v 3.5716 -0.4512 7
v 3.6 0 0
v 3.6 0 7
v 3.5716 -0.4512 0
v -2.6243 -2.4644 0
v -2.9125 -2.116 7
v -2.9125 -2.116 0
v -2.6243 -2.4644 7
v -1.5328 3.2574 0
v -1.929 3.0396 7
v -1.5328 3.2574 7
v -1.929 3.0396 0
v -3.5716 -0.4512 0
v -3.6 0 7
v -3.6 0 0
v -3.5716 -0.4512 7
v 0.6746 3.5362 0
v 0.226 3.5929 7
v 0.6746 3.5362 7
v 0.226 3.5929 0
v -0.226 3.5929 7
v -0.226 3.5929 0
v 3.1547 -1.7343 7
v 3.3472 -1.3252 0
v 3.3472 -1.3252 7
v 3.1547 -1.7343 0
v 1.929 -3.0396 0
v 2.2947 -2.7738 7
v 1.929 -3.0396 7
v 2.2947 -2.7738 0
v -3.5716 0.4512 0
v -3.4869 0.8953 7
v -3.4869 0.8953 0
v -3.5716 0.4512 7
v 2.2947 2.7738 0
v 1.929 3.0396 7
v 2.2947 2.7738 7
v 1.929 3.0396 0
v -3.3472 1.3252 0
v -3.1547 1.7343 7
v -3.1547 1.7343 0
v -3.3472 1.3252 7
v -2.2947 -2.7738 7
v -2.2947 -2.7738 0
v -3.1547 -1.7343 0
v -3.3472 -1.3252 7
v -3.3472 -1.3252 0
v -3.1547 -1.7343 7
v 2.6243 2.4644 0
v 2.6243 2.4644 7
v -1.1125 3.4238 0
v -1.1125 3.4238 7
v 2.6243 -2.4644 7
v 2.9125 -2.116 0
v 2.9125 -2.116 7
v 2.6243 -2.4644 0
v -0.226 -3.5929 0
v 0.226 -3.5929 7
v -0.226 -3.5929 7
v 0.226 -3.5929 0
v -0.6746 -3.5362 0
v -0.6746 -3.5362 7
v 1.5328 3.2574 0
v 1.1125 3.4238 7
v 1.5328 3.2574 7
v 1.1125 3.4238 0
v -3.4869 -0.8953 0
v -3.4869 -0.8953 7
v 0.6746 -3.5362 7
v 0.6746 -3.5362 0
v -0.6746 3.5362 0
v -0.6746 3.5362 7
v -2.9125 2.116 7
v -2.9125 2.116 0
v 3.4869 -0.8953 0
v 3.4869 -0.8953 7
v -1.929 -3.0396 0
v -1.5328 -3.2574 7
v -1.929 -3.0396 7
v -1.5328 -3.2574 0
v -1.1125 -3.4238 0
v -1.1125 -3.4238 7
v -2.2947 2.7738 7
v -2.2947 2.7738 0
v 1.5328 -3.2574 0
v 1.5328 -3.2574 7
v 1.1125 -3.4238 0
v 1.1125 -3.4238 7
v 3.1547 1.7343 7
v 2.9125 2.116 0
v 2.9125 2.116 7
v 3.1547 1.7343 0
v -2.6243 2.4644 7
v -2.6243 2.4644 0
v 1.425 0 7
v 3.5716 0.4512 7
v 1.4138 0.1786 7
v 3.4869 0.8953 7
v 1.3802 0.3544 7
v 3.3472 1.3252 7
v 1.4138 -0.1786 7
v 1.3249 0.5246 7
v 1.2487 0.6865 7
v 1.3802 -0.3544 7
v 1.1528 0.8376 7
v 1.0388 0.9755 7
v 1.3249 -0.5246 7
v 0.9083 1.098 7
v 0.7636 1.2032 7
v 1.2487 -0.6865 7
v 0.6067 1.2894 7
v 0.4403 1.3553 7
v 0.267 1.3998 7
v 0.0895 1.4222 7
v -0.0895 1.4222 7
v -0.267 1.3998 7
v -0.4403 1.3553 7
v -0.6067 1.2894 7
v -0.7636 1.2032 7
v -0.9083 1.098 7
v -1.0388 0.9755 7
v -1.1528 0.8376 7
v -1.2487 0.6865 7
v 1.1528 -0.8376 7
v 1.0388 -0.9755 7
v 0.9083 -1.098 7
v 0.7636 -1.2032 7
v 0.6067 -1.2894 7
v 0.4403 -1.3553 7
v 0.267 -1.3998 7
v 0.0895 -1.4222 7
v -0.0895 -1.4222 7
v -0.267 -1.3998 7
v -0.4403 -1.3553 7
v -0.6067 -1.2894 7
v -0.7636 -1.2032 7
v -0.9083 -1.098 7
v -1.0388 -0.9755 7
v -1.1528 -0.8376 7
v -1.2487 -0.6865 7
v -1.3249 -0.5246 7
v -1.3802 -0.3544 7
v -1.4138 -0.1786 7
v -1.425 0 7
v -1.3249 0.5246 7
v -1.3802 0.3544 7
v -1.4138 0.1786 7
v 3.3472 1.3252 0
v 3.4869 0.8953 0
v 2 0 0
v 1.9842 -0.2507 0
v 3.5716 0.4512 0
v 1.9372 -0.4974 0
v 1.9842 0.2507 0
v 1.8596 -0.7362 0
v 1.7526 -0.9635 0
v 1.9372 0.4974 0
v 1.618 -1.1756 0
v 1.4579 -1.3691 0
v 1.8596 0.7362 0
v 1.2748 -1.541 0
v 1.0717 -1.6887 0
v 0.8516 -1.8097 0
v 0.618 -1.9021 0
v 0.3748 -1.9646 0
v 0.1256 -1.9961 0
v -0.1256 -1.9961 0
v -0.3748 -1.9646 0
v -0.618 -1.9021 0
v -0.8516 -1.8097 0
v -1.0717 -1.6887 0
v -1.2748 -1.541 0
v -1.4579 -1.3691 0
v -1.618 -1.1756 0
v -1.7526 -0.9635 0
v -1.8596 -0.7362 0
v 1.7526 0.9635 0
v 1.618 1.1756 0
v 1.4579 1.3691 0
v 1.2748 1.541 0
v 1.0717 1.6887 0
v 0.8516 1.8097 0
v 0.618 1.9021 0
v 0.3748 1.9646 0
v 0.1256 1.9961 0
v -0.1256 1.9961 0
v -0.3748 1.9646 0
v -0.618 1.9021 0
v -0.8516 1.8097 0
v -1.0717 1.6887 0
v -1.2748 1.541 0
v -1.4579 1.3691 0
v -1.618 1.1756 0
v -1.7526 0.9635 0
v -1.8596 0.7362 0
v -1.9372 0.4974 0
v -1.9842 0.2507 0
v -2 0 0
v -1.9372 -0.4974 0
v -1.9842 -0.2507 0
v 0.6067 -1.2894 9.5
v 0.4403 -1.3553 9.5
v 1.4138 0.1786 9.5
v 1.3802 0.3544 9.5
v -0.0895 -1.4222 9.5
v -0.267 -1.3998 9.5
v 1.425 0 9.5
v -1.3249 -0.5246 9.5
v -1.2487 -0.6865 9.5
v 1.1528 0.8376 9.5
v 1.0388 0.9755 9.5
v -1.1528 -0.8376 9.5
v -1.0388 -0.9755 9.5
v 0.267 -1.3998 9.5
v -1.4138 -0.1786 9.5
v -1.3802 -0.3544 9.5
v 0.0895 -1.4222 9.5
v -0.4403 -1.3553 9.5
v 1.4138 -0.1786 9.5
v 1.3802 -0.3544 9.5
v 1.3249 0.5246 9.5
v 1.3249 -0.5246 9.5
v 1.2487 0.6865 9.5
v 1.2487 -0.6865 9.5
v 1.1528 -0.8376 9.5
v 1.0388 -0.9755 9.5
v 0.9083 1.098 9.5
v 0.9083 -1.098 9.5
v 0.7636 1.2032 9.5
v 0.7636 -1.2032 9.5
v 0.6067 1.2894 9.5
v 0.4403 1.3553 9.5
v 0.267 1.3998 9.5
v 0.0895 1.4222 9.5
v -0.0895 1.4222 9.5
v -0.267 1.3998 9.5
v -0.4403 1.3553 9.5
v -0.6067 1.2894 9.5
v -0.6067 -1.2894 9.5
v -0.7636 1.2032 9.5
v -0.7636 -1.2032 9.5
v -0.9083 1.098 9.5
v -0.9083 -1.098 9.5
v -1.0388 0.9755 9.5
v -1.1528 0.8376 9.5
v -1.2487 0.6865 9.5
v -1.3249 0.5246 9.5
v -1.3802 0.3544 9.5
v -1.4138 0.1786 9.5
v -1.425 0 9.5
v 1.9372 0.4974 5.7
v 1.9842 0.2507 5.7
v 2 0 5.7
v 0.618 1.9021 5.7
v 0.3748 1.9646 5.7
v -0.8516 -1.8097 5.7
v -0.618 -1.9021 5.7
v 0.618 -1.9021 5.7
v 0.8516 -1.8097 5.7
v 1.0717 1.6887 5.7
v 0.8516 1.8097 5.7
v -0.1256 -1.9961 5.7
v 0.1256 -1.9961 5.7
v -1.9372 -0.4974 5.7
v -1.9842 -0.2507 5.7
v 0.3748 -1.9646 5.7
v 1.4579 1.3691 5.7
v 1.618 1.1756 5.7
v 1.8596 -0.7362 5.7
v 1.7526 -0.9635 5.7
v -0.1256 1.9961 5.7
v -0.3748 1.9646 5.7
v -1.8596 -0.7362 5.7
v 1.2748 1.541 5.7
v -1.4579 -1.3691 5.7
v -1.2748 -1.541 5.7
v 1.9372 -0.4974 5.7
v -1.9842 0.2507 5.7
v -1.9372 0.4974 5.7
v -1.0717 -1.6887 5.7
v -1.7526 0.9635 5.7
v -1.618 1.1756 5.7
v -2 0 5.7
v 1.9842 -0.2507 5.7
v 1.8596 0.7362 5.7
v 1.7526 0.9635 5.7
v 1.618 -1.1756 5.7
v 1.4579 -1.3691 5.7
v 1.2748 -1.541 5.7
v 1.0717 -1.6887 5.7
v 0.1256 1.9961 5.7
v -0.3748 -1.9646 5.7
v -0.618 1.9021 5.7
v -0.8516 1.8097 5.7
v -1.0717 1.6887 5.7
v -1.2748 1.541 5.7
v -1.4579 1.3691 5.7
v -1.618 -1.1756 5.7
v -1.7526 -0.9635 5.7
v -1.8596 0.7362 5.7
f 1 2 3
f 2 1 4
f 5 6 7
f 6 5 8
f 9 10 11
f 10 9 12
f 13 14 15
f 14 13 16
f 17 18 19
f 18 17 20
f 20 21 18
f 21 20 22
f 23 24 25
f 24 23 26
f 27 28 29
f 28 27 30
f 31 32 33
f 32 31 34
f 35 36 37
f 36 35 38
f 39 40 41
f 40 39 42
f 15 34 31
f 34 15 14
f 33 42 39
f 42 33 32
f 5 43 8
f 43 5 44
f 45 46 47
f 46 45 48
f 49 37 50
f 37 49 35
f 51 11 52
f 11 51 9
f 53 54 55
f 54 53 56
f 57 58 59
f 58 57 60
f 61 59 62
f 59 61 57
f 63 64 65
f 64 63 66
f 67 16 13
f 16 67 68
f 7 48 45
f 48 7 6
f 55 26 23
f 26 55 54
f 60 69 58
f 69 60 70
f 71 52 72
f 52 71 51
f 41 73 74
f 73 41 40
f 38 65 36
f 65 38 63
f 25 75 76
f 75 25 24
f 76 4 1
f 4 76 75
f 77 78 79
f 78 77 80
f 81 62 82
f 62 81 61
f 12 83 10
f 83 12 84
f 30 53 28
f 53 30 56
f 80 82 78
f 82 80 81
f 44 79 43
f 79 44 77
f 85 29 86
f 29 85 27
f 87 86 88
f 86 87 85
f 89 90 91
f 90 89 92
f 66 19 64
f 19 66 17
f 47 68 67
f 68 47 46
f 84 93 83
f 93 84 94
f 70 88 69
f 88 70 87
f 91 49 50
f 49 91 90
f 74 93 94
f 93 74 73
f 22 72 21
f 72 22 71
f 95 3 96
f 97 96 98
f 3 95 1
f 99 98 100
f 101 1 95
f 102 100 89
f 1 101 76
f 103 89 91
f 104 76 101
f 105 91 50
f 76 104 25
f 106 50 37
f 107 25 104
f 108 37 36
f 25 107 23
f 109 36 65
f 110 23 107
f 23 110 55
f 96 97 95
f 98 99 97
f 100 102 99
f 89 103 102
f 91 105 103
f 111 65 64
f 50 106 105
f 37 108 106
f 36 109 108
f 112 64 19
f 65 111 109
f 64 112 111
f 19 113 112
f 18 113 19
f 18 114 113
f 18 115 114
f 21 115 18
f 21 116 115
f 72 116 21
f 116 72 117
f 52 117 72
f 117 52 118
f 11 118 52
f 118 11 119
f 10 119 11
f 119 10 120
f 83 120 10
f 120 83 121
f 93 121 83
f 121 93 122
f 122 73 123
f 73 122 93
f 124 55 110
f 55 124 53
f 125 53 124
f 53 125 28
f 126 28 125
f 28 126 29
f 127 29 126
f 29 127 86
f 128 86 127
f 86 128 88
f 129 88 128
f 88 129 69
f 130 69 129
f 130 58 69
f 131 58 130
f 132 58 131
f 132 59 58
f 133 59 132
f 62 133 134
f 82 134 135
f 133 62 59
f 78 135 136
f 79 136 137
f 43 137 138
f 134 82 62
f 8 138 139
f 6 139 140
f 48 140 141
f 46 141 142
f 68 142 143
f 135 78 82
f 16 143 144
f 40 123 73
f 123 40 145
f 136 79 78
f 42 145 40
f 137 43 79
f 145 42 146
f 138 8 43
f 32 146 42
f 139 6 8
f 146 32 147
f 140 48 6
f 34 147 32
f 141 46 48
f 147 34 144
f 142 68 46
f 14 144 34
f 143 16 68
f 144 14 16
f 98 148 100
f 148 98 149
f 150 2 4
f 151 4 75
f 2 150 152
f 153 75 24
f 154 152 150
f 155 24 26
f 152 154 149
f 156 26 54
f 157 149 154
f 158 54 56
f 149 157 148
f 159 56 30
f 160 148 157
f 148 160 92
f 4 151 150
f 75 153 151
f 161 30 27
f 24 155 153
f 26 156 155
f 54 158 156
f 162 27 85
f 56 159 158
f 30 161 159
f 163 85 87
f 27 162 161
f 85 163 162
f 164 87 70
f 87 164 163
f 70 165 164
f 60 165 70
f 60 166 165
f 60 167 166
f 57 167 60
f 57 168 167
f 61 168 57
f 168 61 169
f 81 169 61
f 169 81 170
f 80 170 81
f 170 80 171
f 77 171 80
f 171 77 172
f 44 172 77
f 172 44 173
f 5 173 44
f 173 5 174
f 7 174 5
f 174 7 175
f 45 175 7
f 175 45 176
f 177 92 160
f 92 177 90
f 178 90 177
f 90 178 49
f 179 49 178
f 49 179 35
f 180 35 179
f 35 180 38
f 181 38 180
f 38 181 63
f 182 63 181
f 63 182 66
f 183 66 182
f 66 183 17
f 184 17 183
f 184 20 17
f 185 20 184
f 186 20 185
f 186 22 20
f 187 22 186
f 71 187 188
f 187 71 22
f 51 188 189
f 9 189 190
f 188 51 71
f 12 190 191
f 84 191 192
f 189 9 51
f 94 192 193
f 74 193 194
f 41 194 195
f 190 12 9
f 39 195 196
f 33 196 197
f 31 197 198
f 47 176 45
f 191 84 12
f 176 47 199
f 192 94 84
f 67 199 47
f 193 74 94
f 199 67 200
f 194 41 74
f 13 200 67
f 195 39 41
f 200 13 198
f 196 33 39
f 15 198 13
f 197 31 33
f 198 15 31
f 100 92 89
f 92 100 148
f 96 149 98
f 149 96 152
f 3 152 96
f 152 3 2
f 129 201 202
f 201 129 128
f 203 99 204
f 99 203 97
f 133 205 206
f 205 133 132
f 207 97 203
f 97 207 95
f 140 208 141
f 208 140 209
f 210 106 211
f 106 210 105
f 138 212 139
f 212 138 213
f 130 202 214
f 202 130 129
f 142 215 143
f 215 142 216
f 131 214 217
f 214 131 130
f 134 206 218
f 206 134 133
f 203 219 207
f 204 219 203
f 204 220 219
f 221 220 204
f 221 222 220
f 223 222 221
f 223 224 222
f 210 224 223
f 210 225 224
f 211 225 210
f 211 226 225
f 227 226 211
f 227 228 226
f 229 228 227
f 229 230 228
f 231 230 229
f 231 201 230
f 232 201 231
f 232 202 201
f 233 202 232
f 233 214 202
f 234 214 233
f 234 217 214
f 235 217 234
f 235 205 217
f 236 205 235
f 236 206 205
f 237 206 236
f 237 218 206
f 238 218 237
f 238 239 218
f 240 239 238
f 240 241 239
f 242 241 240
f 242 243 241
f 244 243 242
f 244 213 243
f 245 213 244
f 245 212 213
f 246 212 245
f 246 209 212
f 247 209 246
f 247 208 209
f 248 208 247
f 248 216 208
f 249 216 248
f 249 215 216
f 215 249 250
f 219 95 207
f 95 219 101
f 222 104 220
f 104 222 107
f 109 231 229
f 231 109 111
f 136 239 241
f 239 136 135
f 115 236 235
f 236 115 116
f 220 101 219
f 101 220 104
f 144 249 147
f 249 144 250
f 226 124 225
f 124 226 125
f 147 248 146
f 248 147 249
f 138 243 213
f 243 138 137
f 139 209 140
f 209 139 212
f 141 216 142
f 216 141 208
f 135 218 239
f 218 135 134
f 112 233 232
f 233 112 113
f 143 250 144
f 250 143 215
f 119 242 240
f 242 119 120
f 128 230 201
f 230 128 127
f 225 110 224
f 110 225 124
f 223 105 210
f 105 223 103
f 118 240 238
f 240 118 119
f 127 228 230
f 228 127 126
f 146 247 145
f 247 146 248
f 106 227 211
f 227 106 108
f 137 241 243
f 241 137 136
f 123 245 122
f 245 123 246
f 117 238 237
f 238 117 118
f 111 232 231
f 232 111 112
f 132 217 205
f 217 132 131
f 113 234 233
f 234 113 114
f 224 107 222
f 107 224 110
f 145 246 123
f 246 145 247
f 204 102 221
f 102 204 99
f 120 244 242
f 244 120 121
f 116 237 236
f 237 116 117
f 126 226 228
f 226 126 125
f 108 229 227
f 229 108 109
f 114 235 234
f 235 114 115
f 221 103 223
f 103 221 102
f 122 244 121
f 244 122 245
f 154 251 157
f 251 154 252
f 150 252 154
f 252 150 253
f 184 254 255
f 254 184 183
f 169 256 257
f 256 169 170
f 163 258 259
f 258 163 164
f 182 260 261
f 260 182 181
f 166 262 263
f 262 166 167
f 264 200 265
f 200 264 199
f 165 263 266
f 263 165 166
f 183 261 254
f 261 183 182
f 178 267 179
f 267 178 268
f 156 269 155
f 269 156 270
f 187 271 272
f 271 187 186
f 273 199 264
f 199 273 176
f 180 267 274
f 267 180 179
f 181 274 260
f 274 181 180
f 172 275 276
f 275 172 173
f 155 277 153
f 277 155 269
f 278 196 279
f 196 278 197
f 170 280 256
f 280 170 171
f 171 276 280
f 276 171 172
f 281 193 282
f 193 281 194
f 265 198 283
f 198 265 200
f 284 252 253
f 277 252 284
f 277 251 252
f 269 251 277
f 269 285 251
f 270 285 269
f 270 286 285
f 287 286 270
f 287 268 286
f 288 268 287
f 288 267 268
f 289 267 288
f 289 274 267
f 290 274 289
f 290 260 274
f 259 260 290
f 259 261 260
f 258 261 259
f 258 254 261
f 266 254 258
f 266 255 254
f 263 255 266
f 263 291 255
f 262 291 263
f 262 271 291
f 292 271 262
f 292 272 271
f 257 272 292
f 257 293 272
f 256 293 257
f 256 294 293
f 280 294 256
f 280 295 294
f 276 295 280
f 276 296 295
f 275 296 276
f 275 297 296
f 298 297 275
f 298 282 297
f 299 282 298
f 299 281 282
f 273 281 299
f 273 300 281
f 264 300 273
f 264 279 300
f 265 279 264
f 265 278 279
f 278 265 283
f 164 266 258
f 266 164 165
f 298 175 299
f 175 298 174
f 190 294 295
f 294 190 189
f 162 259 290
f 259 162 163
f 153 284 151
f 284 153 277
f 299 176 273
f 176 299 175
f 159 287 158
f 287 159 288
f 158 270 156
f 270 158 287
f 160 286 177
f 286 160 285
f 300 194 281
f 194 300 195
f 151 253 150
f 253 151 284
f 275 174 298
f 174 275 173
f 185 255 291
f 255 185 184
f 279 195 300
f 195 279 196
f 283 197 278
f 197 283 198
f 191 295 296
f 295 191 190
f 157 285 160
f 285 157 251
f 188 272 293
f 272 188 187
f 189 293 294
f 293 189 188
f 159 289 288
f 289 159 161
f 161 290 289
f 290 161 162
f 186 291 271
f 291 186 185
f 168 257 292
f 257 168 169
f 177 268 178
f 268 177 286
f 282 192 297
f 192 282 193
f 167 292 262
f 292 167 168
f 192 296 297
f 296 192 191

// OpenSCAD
// distanziali Ruthex M2.5
// vedi
// https://www.3djake.it/ruthex/inserto-filettato-m25-70-pezzi?sai=15205
// Novembre 2025

// distanziale top
phi_t = 2.85;
h_t = 2.5;
// distanziale bottom
phi_b = 4+1.6*2;
h_b = 7;
// foro per ruthex M2.5
phi_h = 4;
h_h = 5.7;

difference() {
    union () {
        translate([0,0,0])
            linear_extrude(height=h_b)
            circle(d=phi_b,$fn=50);
        translate([0,0,h_b])
            linear_extrude(height=h_t)
            circle(d=phi_t,$fn=50);
    }
    translate([0,0,0])
        linear_extrude(height=h_h)
        circle(d=phi_h,$fn=50);
}
